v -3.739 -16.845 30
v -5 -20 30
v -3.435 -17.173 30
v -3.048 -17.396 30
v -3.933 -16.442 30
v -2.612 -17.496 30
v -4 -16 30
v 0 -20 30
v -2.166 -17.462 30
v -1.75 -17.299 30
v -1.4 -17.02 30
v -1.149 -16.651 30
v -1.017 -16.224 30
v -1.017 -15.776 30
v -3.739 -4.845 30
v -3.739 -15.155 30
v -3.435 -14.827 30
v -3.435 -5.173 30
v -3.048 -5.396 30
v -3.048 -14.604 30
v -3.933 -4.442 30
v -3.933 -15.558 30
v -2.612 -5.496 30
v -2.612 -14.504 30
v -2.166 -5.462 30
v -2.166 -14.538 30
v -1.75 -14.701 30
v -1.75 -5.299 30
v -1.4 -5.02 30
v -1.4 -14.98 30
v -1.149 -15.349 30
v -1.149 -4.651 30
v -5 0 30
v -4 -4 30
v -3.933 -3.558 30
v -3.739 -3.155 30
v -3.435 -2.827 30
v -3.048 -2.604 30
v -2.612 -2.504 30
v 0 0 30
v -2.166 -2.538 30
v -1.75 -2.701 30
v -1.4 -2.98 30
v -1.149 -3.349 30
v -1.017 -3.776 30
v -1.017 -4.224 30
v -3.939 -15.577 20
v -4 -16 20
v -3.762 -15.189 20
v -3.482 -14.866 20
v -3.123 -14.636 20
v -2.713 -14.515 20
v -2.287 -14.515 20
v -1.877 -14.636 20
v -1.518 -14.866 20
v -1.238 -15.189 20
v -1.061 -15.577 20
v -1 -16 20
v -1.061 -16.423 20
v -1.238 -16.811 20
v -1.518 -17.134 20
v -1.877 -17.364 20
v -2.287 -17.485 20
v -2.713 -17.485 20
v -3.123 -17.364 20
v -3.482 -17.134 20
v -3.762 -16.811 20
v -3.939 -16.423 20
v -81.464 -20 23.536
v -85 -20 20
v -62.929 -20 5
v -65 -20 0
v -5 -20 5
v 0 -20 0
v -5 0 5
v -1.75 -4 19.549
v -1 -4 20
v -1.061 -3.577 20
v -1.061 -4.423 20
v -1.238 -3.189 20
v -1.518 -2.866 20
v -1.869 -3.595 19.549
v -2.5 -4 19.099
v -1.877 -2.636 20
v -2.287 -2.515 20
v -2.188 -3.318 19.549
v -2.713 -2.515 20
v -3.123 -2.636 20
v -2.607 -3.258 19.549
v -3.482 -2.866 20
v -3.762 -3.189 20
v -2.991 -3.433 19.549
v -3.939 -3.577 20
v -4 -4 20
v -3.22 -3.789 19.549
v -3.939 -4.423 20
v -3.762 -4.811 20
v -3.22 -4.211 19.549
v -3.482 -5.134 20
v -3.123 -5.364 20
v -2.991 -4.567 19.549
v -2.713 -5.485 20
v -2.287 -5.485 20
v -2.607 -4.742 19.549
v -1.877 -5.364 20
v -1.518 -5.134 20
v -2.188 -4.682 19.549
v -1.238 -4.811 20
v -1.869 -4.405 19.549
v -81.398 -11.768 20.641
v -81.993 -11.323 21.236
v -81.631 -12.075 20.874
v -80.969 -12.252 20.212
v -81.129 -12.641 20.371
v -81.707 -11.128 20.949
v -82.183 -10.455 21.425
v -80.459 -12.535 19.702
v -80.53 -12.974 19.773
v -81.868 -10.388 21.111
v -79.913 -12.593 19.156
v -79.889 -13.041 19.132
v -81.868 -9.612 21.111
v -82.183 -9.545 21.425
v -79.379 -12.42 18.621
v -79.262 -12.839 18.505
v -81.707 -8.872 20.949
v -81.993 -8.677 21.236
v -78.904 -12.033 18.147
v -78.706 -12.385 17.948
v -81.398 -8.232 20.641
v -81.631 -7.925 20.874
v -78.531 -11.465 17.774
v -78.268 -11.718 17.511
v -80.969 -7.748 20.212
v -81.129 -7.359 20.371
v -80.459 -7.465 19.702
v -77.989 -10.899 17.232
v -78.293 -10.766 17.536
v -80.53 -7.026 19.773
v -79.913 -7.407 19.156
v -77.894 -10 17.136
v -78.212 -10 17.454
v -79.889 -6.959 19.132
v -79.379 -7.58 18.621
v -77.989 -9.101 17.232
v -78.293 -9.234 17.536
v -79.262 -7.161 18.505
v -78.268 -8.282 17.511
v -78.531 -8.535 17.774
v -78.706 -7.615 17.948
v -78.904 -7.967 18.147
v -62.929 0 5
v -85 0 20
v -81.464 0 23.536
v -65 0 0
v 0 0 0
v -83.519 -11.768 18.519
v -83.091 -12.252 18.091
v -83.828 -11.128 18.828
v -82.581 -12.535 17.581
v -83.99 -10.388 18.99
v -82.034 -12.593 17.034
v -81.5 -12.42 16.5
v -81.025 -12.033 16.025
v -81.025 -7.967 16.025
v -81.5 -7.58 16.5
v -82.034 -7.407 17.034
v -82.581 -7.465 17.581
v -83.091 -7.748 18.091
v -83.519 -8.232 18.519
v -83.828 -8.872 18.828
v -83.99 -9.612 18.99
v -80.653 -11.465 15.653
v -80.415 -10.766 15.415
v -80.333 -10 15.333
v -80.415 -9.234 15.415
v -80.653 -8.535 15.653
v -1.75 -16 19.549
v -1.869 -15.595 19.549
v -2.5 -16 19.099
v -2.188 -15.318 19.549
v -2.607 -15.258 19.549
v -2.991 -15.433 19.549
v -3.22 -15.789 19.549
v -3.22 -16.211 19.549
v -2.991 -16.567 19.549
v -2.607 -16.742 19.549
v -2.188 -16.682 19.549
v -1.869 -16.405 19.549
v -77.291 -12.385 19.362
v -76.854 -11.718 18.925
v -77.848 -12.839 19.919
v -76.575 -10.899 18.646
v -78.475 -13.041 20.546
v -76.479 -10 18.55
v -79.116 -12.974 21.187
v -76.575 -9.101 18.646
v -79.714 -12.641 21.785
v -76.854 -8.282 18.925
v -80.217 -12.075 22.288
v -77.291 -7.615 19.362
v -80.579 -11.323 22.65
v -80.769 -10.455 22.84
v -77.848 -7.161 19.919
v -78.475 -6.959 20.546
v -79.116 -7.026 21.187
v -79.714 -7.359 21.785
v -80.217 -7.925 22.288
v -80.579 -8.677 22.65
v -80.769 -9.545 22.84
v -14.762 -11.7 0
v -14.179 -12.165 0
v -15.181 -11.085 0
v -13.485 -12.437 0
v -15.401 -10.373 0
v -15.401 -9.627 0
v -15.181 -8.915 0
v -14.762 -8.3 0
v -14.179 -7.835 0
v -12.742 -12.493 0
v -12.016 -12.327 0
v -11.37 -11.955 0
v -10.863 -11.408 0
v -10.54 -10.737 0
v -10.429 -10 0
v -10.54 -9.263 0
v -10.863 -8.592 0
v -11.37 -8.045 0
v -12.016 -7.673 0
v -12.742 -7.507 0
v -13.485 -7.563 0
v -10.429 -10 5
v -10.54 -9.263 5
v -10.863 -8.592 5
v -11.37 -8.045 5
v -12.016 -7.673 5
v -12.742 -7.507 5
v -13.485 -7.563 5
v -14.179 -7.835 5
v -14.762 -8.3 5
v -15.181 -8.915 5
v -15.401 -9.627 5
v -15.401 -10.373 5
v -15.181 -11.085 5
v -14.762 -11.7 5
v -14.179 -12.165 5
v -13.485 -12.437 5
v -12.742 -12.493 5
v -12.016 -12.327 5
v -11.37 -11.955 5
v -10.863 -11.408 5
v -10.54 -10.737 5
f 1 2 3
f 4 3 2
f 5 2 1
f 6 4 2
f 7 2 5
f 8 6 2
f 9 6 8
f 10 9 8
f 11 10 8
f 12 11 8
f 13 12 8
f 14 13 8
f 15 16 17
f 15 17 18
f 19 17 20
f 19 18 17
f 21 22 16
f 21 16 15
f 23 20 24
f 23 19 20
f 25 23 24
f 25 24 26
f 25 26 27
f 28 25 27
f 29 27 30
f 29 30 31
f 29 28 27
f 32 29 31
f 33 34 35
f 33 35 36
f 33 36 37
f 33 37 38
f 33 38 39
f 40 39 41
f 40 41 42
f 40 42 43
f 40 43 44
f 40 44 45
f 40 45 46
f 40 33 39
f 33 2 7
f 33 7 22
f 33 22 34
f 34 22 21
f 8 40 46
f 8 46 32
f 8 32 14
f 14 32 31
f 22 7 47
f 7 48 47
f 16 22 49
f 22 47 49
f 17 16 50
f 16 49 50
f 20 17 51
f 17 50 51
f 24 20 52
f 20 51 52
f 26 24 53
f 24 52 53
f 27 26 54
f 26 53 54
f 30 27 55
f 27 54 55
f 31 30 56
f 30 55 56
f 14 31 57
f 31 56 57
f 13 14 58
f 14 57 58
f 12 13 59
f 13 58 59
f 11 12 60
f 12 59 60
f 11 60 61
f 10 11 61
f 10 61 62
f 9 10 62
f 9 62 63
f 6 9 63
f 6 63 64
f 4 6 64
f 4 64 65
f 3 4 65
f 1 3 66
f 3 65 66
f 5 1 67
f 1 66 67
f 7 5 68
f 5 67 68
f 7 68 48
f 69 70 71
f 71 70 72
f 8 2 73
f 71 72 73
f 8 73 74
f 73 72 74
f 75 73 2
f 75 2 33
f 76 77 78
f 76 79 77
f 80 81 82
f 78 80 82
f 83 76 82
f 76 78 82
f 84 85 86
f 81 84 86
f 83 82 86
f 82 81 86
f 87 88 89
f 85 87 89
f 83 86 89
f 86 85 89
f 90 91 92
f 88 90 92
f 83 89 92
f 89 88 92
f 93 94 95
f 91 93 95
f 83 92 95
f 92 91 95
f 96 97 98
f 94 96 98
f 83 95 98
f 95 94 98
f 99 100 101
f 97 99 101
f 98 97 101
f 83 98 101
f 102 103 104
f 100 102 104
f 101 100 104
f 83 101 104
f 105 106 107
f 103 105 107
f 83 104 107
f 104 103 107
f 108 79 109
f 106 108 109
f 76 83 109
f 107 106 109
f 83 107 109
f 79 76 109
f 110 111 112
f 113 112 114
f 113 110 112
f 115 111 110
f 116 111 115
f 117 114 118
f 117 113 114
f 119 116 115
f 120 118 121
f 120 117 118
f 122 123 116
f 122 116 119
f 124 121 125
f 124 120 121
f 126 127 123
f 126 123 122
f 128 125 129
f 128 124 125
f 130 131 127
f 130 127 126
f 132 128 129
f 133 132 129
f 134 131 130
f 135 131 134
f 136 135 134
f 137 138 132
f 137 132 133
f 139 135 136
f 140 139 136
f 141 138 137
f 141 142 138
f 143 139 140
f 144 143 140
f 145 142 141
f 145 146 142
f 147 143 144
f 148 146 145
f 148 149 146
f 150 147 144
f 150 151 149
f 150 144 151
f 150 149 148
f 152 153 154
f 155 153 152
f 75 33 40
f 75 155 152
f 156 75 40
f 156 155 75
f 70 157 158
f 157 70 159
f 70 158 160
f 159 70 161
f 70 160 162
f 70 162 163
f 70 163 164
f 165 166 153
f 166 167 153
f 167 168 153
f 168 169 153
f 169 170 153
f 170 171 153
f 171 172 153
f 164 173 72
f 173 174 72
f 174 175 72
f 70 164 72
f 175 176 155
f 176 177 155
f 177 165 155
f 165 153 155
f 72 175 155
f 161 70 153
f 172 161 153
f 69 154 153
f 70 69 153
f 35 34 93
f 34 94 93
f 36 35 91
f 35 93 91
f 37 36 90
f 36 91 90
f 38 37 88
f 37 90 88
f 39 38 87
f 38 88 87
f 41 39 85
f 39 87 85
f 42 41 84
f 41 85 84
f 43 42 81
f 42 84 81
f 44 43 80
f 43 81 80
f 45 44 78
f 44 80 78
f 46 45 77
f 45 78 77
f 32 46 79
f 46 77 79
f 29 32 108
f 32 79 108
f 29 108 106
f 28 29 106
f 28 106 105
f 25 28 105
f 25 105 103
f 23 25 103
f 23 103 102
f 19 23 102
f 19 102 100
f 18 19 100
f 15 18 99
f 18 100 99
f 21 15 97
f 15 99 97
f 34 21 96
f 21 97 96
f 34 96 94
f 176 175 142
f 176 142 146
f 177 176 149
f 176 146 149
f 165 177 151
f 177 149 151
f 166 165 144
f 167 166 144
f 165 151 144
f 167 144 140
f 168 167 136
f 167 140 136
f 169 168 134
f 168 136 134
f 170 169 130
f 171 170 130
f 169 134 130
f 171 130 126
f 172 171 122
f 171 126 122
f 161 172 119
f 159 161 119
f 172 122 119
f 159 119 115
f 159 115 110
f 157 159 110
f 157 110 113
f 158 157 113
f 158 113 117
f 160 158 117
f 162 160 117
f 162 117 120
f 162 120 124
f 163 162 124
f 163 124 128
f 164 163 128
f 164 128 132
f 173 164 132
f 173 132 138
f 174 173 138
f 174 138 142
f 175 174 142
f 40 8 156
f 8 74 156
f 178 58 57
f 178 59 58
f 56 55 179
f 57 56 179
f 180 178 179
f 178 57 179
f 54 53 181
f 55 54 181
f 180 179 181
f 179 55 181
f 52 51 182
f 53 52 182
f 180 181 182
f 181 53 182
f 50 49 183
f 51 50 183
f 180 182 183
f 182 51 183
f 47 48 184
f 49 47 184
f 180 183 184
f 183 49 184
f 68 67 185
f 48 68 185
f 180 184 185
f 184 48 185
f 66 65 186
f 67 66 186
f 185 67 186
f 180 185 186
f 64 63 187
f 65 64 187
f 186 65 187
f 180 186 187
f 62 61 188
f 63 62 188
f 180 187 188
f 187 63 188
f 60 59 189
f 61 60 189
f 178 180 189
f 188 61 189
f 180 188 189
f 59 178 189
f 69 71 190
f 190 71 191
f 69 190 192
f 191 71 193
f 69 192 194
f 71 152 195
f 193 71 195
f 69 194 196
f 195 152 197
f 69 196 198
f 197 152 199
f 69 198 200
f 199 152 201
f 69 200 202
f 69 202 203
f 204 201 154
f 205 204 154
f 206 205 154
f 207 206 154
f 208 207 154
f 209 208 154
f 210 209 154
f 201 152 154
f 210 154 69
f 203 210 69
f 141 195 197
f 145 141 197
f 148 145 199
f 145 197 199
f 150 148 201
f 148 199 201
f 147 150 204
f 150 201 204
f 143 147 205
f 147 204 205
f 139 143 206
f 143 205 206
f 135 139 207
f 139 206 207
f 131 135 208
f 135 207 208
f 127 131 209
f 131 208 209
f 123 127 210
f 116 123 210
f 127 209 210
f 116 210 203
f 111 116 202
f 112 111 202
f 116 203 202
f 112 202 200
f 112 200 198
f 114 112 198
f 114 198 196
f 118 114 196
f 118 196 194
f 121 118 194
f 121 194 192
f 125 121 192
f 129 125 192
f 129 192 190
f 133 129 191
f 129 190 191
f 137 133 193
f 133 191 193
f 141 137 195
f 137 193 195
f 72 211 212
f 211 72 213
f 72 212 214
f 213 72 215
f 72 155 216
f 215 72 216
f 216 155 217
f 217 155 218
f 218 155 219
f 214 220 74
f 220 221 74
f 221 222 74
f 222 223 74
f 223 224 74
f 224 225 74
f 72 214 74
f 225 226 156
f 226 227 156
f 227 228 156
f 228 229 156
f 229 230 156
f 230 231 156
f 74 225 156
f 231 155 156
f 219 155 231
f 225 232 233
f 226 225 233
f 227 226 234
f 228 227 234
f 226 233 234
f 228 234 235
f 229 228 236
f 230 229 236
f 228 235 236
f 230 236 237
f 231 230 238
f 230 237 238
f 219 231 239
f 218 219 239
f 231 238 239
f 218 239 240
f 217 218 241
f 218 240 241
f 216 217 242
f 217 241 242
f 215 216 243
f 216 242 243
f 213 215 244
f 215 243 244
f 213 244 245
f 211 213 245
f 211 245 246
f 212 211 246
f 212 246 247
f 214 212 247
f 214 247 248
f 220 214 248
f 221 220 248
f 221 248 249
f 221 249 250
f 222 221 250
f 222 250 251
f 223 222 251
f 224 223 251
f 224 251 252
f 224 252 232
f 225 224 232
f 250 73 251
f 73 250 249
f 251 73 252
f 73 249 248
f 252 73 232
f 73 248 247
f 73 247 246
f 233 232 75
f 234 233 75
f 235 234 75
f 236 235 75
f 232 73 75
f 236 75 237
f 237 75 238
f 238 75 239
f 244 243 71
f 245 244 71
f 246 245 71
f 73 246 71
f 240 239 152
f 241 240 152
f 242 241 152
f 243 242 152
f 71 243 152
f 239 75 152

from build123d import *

# Parameters (mm, degrees)
F1_DEPTH  = 20
F2_R      = 2.6
F3_DEPTH  = 19.1431356237
F4_R      = 2.5
F5_DEPTH  = 5.001
F6_R      = 3.05
F7_DEPTH  = 2
F8_W      = 5
F8_H      = 20
F9_DEPTH  = 25
F11_D     = 3
F11_DEPTH = 10
F11_TIP   = 0.9012909285


with BuildPart() as f1:
    # F0 (on Front) → F1 (new body)
    with BuildSketch(Plane.XZ):
        Polygon((-65, 0), (0, 0), (0, 5), (-62.9289321881, 5), (-81.4644660941, 23.5355339059), (-85, 20), align=None)
    extrude(amount=F1_DEPTH)

    # F2 (on face) → F3 (cut, through all)
    with BuildSketch(Plane(origin=(-28.9644660941, 0, -28.9644660941), x_dir=(0.7071067812, 0, -0.7071067812), z_dir=(0.7071067812, 0, 0.7071067812))):
        with Locations((-70.2462120246, -10)):
            Circle(F2_R)
    extrude(amount=-F3_DEPTH, mode=Mode.SUBTRACT)

    # F4 (on face) → F5 (cut, through all)
    with BuildSketch(Plane.XY.offset(5)):
        with Locations((-12.9289321881, -10)):
            Circle(F4_R)
    extrude(amount=-F5_DEPTH, mode=Mode.SUBTRACT)

    # F6 (on face) → F7 (cut)
    with BuildSketch(Plane(origin=(-28.9644660941, 0, -28.9644660941), x_dir=(0.7071067812, 0, -0.7071067812), z_dir=(0.7071067812, 0, 0.7071067812))):
        with Locations((-70.2462120246, -10)):
            Circle(F6_R)
    extrude(amount=-F7_DEPTH, mode=Mode.SUBTRACT)

    # F8 (on face) → F9 (join)
    with BuildSketch(Plane.XY.offset(5)):
        with Locations((-2.5, -10)):
            Rectangle(F8_W, F8_H)
    extrude(amount=F9_DEPTH)

    # F11
    with Locations(Plane.XY.offset(30)):
        with Locations((-2.5, -16), (-2.5, -4)):
            Hole(F11_D / 2, depth=F11_DEPTH)
            with Locations((0, 0, -(F11_DEPTH + F11_TIP / 2))):  # 118° drill point
                Cone(0, F11_D / 2, F11_TIP, mode=Mode.SUBTRACT)


solid = f1.part
